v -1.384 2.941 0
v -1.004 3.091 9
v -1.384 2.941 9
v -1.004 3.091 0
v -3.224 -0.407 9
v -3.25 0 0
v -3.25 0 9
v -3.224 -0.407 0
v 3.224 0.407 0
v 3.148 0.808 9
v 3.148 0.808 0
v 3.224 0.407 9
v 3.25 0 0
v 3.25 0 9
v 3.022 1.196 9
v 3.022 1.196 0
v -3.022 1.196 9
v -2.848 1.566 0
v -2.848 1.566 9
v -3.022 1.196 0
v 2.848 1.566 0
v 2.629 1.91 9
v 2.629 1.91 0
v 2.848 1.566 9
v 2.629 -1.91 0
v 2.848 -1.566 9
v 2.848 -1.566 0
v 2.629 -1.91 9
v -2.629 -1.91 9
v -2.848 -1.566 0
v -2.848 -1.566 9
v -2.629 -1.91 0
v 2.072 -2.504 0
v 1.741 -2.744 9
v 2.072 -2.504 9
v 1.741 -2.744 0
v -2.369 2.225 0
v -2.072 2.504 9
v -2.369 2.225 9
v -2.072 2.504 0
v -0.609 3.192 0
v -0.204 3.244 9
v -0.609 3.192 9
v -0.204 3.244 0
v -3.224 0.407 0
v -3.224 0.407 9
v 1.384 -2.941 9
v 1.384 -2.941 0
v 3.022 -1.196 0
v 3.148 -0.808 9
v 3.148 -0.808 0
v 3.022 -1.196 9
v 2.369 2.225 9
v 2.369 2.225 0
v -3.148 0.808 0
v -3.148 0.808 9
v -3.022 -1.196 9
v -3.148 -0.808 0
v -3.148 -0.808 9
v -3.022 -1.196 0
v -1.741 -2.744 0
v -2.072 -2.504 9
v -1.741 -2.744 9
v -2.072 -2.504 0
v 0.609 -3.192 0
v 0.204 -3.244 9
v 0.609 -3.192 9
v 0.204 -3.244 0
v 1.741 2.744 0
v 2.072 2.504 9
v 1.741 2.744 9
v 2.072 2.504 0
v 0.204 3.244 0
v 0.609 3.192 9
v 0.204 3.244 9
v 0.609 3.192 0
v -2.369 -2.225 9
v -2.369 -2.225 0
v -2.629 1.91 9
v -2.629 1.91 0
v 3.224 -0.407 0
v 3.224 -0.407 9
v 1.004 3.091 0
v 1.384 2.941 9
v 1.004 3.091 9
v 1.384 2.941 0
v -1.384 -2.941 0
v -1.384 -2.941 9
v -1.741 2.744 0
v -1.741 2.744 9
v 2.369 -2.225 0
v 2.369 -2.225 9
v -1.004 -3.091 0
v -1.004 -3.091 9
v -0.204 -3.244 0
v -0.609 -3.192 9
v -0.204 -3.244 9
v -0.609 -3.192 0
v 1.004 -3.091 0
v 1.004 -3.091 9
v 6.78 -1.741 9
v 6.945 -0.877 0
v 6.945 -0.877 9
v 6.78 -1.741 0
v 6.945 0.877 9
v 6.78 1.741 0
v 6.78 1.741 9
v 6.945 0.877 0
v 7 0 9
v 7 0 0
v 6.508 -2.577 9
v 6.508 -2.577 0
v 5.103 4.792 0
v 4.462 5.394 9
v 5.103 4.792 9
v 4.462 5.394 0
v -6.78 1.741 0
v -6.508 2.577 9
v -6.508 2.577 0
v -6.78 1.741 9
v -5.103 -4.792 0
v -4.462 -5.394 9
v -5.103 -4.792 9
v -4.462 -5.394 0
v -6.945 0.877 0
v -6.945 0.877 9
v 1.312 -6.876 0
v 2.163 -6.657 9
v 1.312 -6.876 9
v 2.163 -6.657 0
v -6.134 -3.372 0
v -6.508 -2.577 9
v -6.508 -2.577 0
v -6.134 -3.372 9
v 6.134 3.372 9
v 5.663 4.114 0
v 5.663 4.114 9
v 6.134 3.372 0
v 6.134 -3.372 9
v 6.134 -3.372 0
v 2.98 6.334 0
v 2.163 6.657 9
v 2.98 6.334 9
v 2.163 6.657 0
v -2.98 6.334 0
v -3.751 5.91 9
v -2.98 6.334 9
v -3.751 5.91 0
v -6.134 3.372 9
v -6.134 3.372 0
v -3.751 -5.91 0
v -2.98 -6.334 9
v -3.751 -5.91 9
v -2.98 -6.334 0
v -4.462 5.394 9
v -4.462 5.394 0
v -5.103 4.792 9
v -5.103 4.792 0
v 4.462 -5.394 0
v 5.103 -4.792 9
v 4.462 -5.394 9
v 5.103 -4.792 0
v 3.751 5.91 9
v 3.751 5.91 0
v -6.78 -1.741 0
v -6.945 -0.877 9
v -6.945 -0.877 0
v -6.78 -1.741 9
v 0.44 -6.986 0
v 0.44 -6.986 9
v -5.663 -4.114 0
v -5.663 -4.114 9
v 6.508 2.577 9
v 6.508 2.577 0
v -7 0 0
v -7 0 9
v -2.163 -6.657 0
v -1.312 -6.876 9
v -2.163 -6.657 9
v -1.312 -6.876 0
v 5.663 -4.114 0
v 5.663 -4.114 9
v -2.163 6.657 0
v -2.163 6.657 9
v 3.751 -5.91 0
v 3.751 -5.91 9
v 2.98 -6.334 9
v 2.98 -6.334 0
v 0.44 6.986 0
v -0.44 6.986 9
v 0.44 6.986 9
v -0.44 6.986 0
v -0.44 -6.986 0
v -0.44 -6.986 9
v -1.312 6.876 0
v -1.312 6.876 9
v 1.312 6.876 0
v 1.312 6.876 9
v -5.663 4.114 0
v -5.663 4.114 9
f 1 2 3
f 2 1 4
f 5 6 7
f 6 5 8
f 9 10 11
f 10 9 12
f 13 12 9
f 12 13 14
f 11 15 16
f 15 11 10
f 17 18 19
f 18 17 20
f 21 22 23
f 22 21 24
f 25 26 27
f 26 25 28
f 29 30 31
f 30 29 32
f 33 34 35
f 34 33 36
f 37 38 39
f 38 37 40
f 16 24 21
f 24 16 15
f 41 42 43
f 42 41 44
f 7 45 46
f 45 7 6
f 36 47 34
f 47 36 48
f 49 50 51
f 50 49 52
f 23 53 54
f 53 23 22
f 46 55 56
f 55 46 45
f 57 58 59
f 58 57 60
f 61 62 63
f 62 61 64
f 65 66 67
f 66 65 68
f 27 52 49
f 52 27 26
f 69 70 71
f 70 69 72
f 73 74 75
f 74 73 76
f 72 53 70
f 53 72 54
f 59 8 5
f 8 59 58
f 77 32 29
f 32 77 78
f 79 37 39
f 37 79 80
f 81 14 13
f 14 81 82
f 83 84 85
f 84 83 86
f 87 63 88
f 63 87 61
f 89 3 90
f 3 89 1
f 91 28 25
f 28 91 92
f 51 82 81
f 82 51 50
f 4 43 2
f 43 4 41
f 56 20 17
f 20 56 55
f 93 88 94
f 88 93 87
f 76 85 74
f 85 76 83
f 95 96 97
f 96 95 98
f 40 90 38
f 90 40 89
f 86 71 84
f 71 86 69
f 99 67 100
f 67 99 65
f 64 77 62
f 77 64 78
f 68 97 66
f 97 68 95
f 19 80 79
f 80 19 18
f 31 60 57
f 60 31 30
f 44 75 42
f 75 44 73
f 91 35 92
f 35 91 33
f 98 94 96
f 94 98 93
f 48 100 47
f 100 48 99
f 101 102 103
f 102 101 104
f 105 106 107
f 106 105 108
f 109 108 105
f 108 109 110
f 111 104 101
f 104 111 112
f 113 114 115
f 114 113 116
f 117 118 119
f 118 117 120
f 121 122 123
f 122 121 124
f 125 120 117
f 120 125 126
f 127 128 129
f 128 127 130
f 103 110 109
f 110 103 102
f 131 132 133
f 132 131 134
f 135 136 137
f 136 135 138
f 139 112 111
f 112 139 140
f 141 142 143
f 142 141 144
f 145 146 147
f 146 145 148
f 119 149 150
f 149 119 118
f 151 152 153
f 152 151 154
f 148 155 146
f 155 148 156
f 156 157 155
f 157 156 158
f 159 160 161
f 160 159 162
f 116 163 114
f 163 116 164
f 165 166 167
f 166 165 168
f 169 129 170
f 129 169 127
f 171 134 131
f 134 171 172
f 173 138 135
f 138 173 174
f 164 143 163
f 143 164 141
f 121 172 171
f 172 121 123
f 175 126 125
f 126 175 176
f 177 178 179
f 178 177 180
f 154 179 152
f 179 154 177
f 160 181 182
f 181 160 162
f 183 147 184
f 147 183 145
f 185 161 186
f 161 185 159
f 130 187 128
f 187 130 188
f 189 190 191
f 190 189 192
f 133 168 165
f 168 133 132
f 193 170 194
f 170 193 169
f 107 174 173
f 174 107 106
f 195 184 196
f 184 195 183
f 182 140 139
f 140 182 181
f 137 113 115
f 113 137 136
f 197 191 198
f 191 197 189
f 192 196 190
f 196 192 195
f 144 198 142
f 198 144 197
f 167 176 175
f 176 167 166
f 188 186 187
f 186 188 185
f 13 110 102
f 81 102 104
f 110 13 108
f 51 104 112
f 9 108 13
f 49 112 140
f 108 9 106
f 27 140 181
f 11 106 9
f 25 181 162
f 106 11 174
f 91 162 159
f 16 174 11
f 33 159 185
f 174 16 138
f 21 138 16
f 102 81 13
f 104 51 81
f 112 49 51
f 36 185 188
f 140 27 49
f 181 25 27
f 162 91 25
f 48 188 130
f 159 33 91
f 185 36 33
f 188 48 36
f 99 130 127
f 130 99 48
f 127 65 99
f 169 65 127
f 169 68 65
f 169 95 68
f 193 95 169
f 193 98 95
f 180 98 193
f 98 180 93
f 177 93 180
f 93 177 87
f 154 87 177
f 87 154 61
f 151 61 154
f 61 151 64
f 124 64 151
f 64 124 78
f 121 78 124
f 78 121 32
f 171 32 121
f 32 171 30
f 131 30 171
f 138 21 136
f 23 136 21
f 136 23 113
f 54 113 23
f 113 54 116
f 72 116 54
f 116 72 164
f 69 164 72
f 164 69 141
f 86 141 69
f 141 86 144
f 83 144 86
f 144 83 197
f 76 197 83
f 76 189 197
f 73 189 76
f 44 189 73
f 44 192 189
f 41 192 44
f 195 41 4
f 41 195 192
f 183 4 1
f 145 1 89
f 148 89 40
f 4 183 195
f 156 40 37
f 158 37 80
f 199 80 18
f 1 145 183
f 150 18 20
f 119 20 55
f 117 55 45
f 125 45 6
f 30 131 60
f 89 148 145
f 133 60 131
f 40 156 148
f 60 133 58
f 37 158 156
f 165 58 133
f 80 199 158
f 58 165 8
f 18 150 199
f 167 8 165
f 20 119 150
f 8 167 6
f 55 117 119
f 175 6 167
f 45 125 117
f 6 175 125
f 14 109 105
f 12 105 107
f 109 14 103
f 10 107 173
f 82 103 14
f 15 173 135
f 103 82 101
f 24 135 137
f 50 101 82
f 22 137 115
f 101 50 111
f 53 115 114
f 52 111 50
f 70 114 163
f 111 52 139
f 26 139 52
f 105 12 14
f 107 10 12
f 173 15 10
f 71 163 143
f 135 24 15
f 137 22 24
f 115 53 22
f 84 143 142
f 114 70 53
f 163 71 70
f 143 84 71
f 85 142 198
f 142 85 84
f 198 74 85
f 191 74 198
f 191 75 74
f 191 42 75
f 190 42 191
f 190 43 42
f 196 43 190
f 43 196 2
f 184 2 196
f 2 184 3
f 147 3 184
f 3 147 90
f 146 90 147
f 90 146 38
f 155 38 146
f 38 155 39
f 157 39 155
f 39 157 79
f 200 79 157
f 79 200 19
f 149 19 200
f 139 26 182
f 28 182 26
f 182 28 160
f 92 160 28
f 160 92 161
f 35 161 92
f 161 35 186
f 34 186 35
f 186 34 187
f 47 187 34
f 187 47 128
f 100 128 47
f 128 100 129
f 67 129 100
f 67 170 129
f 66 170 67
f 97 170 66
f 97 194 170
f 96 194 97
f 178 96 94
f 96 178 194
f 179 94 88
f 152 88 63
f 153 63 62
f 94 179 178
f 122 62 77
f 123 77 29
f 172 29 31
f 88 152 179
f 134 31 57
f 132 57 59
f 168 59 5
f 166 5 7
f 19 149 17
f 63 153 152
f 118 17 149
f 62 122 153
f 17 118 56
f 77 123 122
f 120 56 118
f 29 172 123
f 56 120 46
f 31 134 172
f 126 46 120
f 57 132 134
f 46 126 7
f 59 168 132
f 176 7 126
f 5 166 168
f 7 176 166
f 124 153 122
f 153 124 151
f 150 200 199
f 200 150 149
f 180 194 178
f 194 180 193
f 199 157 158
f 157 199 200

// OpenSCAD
$fn = 50;


difference() {
	union() {
		*color(alpha = 1.0000000000, c = "gray") {
			translate(v = [0, 7, 0]) {
				linear_extrude(height = 1) {
					text(font = "Arial:style=Bold", halign = "center", size = 4.5000000000, text = "COMMENT plate main", valign = "center");
				}
			}
		}
		*color(alpha = 1.0000000000, c = "gray") {
			translate(v = [0, 14, 0]) {
				linear_extrude(height = 1) {
					text(font = "Arial:style=Bold", halign = "center", size = 4.5000000000, text = "COMMENT description oobb_plate_shape_p_type_9_depth_1_width_1_height_9_thickness_true_both_holes", valign = "center");
				}
			}
		}
		cylinder(h = 9, r = 7.0000000000);
	}
	union() {
		*color(alpha = 1.0000000000, c = "gray") {
			translate(v = [0, 7, 0]) {
				linear_extrude(height = 1) {
					text(font = "Arial:style=Bold", halign = "center", size = 4.5000000000, text = "COMMENT holes main", valign = "center");
				}
			}
		}
		*color(alpha = 1.0000000000, c = "gray") {
			translate(v = [0, 14, 0]) {
				linear_extrude(height = 1) {
					text(font = "Arial:style=Bold", halign = "center", size = 4.5000000000, text = "COMMENT description oobb_holes_shape_n_type_1_width_1_height_9_thickness_true_both_holes", valign = "center");
				}
			}
		}
		translate(v = [0, 0, -50]) {
			cylinder(h = 100, r = 3.2500000000);
		}
		translate(v = [0, 0, -50]) {
			cylinder(h = 100, r = 1.8000000000);
		}
	}
}
